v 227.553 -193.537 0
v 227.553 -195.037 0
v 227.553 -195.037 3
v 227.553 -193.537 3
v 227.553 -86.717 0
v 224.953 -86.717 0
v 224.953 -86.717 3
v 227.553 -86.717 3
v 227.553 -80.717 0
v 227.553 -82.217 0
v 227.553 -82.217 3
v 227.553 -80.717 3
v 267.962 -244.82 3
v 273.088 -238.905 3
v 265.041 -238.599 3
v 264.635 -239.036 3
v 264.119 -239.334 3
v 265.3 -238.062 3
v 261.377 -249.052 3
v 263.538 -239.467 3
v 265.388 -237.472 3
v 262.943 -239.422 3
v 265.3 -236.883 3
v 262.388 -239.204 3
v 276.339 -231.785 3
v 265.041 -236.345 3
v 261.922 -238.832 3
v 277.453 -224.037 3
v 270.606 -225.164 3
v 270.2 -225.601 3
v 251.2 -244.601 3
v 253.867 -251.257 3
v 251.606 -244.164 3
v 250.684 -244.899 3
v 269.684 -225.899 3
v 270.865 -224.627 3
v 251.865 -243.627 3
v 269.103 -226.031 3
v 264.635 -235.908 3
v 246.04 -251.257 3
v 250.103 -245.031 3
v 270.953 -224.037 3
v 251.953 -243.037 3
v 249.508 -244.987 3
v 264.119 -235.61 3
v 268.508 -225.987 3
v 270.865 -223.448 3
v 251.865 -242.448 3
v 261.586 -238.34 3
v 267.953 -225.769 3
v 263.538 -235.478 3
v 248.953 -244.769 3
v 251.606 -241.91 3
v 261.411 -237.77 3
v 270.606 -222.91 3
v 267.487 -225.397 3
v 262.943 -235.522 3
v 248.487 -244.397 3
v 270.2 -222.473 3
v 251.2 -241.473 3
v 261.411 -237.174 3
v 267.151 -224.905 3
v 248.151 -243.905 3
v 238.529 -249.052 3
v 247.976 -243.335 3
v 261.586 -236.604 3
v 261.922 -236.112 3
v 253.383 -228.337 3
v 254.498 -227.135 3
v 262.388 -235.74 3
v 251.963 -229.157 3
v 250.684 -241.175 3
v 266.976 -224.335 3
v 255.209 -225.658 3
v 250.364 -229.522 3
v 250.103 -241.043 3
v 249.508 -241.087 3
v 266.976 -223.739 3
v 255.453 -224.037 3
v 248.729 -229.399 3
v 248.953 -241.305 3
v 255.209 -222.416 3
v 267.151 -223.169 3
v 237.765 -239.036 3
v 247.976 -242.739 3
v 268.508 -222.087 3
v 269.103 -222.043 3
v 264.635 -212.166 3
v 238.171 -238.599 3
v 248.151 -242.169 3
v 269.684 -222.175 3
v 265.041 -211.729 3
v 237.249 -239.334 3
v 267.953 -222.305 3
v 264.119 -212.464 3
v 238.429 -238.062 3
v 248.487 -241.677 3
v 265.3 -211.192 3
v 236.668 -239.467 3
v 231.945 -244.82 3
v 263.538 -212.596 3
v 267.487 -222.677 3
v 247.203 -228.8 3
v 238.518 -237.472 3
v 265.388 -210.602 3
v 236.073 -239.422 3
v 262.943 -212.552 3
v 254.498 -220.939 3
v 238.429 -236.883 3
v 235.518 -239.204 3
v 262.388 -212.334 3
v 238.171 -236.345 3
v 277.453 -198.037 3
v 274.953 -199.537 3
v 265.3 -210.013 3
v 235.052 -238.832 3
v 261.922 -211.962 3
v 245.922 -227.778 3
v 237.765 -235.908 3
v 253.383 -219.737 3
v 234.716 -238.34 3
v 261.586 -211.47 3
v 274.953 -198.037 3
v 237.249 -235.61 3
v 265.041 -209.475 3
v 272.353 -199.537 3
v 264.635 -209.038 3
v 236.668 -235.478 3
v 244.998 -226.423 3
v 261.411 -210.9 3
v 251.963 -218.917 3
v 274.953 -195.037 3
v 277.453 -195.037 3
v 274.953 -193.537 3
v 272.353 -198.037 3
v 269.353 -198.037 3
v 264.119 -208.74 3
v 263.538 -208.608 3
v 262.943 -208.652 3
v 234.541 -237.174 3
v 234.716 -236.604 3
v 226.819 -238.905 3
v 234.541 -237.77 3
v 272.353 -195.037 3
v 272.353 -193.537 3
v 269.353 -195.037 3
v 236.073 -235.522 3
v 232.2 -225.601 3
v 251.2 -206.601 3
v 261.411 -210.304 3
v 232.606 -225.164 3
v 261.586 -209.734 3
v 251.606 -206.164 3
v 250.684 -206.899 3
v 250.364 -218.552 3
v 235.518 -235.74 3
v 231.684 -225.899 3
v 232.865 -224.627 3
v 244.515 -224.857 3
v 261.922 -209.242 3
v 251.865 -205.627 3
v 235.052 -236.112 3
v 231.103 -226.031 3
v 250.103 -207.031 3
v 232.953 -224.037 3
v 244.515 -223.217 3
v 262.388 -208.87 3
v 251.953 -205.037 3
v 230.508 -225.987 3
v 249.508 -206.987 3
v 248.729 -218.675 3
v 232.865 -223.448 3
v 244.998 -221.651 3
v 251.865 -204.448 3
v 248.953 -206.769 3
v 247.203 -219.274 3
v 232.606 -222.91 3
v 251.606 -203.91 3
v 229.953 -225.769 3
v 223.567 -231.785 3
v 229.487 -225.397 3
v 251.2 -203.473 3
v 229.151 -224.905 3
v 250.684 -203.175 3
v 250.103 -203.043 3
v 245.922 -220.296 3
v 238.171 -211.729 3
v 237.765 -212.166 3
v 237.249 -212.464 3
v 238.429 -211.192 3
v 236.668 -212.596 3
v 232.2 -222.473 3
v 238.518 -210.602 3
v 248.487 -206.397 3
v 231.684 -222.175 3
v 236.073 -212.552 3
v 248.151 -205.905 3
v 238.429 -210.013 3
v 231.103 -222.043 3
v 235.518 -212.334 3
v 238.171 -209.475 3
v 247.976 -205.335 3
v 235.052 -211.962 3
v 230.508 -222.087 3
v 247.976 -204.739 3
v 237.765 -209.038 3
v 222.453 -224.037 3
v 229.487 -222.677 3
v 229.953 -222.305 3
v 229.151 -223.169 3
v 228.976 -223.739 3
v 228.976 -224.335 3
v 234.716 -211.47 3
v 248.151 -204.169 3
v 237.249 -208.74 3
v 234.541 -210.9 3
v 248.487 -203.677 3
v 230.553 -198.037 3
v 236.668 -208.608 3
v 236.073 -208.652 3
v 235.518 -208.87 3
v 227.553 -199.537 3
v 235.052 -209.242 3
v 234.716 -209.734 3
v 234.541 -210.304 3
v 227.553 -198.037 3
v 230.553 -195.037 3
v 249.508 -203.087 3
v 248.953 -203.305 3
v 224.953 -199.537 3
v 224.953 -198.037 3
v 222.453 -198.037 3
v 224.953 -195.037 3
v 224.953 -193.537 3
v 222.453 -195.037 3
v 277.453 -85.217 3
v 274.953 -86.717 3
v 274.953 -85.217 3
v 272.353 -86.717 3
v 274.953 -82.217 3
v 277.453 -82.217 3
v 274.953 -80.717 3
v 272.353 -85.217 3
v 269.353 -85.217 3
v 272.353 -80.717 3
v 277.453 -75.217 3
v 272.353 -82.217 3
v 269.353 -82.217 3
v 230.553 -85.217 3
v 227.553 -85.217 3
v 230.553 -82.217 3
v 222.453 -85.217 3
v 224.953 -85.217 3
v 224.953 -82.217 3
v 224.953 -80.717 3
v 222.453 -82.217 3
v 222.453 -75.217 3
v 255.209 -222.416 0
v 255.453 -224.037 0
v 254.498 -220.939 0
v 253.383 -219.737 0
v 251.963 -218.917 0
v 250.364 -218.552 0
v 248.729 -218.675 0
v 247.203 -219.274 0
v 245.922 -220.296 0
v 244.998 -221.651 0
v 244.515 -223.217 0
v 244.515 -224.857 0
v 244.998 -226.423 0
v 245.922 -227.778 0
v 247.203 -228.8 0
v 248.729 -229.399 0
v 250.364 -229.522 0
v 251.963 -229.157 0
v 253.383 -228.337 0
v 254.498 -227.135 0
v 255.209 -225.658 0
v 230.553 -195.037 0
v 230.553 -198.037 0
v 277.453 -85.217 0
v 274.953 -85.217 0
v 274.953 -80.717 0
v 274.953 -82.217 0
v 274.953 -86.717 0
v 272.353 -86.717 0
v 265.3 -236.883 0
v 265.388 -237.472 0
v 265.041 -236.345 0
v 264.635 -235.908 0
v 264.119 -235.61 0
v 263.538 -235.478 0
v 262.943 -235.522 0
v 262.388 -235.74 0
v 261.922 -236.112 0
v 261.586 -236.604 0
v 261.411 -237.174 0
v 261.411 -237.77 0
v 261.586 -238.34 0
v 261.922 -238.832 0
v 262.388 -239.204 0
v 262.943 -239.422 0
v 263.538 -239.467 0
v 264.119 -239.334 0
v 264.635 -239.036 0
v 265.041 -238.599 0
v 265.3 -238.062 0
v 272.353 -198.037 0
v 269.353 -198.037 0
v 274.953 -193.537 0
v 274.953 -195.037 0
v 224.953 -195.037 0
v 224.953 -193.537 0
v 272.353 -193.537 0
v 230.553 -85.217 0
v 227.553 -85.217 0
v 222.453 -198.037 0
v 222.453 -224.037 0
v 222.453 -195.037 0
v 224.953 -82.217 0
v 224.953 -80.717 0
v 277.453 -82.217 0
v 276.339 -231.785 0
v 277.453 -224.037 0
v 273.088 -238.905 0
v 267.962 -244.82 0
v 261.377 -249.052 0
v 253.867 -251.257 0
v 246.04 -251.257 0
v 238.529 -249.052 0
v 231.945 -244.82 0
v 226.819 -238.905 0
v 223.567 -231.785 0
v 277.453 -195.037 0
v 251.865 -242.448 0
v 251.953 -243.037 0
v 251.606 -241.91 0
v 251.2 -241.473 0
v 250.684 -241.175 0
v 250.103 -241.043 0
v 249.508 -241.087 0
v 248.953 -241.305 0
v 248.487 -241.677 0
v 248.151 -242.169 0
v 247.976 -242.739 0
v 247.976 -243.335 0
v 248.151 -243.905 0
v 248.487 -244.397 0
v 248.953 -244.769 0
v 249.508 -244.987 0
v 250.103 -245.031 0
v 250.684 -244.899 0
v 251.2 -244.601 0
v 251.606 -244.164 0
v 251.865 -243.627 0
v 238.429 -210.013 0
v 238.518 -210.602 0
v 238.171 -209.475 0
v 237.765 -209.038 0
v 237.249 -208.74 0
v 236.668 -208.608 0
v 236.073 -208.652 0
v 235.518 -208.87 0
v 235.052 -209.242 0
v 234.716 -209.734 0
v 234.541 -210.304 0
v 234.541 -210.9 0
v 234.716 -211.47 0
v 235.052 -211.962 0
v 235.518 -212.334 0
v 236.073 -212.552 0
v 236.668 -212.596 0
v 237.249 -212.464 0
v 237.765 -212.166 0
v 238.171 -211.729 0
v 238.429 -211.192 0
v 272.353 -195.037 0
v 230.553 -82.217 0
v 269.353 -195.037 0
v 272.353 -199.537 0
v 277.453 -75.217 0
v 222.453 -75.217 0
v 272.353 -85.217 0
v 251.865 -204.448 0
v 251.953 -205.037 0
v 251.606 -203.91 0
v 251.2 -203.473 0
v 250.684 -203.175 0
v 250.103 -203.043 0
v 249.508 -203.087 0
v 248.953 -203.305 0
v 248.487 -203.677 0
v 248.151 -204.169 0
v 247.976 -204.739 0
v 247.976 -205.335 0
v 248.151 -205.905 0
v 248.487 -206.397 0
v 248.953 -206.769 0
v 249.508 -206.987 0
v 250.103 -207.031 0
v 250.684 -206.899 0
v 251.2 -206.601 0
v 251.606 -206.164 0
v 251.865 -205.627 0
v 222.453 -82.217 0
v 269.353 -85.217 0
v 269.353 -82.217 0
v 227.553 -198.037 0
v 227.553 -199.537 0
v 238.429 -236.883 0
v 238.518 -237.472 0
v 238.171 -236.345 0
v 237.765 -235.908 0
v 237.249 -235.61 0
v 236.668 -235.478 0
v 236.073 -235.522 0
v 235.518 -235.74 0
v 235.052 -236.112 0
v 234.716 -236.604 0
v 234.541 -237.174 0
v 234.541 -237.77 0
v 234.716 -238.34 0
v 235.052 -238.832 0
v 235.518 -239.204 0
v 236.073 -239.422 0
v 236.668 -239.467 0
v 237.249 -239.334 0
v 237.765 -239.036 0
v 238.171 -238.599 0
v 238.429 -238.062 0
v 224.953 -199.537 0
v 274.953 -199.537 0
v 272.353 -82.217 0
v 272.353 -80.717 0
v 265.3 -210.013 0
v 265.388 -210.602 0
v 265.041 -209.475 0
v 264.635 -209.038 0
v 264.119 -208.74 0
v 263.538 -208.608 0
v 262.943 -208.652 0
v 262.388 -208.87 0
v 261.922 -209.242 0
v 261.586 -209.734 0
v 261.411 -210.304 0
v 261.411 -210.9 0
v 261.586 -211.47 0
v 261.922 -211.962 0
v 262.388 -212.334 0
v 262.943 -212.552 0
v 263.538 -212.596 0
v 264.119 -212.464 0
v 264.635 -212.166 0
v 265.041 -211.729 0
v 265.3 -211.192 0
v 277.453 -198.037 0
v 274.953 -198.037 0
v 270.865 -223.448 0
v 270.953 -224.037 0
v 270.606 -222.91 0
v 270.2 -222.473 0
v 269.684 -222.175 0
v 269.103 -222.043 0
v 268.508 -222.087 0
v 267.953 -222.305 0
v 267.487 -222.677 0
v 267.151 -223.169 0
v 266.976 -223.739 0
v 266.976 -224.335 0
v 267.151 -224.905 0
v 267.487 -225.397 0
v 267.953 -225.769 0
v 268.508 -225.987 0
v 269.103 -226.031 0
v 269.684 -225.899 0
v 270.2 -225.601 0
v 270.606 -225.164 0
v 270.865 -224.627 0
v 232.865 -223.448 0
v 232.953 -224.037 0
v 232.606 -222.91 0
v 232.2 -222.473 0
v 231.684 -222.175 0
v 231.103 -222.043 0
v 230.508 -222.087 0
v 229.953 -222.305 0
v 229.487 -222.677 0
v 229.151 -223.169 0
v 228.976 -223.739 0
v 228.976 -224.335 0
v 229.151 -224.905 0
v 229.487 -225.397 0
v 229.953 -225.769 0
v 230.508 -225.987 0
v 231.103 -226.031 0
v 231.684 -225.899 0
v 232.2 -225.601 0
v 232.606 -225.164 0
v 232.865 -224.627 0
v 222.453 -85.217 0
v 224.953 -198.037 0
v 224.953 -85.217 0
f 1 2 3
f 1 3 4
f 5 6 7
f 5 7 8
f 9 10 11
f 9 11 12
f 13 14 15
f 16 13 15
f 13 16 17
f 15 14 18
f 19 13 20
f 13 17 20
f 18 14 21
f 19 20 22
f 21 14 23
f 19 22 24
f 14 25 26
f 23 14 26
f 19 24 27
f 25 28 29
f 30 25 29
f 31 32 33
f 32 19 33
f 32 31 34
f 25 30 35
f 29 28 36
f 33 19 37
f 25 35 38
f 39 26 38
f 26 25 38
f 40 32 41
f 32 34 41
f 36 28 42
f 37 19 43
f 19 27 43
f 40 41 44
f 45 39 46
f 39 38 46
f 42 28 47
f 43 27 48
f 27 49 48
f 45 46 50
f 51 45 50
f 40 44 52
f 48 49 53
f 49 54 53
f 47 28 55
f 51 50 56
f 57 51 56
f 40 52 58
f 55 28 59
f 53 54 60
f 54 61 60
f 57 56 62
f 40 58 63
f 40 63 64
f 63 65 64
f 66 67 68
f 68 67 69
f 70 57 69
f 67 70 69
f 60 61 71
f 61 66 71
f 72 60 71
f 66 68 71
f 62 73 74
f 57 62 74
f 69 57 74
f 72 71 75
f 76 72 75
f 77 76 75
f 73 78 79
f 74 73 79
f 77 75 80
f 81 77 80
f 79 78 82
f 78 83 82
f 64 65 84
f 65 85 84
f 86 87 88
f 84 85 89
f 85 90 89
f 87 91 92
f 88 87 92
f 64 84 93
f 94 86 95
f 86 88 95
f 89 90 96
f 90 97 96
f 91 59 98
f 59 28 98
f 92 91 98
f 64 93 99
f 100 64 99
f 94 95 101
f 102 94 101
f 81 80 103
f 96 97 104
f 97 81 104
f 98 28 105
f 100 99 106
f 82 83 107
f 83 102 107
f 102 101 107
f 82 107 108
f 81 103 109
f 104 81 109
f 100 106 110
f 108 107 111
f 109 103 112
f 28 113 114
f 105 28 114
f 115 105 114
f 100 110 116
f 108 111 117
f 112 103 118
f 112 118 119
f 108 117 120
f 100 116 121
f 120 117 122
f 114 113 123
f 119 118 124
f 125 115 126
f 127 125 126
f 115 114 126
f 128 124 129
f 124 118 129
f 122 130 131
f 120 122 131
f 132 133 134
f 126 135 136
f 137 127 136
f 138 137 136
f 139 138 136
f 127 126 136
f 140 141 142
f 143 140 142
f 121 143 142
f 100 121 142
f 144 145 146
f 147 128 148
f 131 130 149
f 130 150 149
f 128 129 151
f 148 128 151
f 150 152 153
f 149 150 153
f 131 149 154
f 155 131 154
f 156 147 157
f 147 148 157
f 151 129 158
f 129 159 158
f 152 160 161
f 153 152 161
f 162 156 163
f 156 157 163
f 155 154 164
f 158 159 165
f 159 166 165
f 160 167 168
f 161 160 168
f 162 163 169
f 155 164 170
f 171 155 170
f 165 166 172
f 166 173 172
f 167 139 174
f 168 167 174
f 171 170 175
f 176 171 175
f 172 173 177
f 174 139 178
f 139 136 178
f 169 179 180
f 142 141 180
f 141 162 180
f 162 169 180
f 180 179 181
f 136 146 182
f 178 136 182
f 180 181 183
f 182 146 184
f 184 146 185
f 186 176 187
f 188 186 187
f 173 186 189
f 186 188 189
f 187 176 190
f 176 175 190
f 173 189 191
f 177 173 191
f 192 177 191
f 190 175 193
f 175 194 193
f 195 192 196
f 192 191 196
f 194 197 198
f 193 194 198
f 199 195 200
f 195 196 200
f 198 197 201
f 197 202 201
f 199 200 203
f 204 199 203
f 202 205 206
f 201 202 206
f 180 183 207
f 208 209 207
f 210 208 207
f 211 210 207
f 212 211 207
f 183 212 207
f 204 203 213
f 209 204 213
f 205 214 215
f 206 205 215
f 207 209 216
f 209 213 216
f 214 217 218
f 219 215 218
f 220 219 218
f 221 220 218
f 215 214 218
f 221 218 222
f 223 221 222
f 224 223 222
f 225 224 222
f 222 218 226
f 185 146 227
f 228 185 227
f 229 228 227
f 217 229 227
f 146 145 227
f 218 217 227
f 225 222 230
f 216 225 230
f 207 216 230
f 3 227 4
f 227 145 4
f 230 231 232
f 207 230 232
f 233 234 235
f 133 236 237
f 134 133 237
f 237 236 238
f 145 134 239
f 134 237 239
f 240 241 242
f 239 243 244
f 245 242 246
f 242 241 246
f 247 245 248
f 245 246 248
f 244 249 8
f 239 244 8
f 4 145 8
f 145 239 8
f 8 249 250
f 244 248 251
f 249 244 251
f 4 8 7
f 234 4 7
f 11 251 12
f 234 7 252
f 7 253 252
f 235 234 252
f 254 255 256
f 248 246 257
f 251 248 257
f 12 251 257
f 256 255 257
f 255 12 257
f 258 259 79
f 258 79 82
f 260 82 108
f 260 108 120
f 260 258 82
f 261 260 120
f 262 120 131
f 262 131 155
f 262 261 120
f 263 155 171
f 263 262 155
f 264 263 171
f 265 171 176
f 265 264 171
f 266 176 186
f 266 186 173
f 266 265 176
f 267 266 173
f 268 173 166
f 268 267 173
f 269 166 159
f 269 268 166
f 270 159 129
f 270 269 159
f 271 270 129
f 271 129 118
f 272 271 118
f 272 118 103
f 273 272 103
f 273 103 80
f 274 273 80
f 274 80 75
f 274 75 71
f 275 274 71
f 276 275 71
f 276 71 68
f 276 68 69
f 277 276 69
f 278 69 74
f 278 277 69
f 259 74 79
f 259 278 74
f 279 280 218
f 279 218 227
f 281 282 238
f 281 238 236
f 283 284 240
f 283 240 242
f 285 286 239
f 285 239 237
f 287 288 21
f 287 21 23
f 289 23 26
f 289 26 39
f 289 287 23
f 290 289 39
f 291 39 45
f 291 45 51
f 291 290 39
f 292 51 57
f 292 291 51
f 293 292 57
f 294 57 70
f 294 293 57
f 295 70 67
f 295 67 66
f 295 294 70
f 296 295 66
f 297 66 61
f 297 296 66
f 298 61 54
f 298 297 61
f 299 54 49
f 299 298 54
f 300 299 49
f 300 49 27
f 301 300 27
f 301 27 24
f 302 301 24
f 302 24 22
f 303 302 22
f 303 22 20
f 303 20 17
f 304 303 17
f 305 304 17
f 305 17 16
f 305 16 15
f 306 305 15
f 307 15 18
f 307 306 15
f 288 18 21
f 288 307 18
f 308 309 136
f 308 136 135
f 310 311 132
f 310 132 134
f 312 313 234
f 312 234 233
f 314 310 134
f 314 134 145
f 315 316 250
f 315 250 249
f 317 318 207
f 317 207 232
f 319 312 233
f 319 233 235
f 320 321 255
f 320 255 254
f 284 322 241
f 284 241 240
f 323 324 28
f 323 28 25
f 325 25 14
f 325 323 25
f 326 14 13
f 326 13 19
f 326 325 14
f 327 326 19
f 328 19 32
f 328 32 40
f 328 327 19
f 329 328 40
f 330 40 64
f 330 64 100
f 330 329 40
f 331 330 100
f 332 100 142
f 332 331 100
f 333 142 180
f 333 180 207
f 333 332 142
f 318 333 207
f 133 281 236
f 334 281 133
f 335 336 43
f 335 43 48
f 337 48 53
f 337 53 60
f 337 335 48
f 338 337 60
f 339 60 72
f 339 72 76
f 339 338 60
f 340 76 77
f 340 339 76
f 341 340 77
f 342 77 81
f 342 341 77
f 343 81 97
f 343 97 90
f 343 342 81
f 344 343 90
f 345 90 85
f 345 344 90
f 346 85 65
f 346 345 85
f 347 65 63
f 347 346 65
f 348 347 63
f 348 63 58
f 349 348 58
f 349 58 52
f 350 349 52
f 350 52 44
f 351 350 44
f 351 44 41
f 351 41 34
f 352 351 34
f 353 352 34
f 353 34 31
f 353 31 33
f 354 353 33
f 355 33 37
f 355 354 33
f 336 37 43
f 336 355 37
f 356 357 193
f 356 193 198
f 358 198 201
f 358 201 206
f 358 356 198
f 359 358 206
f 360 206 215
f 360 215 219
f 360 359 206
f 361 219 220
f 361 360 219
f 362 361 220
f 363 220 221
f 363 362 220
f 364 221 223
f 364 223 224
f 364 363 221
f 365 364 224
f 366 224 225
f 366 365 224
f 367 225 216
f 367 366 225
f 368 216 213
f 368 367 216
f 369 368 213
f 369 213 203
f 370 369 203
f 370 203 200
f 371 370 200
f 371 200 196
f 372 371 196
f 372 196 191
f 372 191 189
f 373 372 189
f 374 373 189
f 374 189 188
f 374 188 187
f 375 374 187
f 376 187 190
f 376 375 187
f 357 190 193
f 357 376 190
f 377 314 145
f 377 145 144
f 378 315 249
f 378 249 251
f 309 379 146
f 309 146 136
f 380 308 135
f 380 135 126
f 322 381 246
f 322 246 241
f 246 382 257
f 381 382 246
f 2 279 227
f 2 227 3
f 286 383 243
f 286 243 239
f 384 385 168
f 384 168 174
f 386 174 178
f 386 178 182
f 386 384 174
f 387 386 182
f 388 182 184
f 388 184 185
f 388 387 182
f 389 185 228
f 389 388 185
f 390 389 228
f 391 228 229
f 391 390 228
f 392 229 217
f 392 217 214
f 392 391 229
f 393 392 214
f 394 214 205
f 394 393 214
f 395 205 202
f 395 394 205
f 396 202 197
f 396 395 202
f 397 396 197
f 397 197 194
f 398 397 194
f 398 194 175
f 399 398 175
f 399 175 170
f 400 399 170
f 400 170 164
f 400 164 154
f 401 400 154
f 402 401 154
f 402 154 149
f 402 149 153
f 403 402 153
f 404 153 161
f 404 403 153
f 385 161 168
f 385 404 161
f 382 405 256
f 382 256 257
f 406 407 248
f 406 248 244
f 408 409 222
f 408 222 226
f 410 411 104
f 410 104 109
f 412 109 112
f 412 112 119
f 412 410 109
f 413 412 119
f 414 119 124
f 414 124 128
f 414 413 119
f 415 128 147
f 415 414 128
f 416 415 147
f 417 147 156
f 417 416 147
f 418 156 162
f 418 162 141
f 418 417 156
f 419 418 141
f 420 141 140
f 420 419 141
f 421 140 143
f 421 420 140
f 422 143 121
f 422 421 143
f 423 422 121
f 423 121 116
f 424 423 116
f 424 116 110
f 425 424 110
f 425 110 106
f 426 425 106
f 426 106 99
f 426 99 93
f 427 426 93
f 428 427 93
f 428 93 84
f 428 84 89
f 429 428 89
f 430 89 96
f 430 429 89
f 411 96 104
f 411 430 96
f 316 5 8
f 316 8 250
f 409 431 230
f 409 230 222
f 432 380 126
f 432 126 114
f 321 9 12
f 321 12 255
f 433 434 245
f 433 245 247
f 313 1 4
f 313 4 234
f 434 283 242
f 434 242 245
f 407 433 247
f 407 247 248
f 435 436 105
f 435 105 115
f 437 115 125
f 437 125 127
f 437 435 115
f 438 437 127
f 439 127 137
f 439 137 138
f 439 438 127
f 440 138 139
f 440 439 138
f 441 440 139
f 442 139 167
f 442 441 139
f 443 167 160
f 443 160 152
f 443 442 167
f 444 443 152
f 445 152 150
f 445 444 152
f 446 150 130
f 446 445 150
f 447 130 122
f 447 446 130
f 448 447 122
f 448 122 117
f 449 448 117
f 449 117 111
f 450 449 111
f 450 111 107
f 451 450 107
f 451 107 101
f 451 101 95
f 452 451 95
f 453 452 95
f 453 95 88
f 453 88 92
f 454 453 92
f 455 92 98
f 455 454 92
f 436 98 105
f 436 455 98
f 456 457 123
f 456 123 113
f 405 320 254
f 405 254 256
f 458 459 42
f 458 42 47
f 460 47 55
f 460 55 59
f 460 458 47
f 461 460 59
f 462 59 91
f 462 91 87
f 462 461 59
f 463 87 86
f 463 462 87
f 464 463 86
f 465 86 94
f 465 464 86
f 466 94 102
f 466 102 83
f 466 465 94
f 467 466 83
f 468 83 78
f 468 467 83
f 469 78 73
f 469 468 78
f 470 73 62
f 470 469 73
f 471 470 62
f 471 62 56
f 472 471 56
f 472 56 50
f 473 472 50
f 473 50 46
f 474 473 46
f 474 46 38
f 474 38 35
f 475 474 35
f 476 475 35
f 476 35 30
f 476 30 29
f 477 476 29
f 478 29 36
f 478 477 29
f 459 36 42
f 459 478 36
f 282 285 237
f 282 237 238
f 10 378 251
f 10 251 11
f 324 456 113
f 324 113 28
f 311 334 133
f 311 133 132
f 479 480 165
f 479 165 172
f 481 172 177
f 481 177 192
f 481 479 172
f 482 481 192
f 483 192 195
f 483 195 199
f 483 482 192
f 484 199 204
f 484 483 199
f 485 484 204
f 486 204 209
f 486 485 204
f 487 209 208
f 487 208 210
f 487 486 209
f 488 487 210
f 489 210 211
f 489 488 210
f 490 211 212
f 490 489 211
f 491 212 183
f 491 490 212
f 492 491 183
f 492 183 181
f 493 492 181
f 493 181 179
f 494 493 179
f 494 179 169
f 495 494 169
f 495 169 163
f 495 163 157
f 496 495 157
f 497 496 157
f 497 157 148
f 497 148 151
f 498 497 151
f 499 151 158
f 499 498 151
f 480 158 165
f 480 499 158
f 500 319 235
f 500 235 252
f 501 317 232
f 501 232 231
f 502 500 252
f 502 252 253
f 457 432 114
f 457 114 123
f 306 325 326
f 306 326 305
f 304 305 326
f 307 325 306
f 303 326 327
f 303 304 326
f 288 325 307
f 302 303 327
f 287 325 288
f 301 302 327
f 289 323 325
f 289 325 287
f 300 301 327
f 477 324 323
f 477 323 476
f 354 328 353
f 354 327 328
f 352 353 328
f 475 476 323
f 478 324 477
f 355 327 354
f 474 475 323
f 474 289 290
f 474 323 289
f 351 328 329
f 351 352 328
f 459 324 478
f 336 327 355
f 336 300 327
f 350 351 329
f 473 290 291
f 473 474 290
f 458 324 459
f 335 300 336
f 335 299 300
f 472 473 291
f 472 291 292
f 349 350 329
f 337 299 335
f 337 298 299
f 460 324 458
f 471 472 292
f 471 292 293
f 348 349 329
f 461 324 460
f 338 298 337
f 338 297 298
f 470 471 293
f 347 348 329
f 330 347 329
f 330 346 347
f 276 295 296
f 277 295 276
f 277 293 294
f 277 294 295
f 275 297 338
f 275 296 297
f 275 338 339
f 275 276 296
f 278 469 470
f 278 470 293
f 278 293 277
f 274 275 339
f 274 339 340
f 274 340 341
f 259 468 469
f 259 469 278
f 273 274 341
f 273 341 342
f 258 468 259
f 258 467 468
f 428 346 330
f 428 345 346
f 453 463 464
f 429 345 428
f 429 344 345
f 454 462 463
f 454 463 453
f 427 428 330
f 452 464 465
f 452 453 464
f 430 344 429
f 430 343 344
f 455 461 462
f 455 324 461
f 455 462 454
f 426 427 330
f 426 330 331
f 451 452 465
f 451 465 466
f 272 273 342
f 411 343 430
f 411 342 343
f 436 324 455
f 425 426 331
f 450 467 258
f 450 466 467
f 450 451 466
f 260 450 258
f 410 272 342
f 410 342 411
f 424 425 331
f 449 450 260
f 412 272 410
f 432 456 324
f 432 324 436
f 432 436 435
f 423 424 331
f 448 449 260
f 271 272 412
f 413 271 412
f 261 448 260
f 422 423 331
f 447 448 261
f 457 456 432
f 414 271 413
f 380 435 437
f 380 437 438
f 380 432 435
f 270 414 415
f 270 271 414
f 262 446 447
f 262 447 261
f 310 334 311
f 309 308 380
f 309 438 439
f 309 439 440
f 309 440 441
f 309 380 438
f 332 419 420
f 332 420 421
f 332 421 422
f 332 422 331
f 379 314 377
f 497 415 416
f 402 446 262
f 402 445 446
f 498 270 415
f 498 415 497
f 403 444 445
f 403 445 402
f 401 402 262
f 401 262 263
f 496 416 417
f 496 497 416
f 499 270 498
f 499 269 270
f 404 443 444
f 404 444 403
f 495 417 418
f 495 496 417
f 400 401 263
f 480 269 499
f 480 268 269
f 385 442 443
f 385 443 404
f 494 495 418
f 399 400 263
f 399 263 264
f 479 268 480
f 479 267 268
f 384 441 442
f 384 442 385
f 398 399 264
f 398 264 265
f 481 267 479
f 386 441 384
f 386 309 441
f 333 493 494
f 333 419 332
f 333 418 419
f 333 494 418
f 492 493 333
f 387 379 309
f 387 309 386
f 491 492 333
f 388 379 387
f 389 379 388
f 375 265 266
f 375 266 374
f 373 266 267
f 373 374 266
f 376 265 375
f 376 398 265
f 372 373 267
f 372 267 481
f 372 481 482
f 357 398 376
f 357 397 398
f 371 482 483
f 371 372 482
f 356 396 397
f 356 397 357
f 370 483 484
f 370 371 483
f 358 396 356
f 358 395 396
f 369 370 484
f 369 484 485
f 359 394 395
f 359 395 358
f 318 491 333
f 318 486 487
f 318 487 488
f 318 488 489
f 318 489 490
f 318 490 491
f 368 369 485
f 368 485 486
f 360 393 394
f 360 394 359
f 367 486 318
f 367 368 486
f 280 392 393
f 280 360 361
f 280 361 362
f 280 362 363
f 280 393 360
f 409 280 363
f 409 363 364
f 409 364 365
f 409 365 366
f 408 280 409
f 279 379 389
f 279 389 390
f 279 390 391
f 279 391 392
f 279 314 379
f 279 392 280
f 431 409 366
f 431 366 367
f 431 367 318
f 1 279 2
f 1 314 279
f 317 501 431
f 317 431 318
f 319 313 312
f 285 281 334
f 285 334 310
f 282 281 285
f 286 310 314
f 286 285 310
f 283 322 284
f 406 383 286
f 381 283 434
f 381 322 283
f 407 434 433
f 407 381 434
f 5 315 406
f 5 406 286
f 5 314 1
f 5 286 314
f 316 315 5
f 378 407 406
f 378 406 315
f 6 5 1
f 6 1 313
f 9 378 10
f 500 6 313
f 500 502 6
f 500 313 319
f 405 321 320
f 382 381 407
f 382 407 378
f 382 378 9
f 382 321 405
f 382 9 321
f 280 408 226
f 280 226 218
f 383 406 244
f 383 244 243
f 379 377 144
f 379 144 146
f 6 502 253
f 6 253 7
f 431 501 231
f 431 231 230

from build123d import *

# Parameters (mm, degrees)
SKETCH_1_R      = 5.5
SKETCH_1_R_2    = 2
EXTRUDE_1_DEPTH = 3


with BuildPart() as part:
    # 草图1 → 凸台-拉伸1 (new body)
    with BuildSketch(Plane.XY):
        with BuildLine():
            Line((222.453360513, -82.216557036), (222.453360513, -75.216557036))
            Line((222.453360513, -75.216557036), (277.453360513, -75.216557036))
            Line((277.453360513, -75.216557036), (277.453360513, -82.216557036))
            Line((277.453360513, -82.216557036), (274.953360513, -82.216557036))
            Line((274.953360513, -82.216557036), (274.953360513, -80.716557036))
            Line((274.953360513, -80.716557036), (272.353360513, -80.716557036))
            Line((272.353360513, -80.716557036), (272.353360513, -82.216557036))
            Line((272.353360513, -82.216557036), (269.353360513, -82.216557036))
            Line((269.353360513, -82.216557036), (269.353360513, -85.216557036))
            Line((269.353360513, -85.216557036), (272.353360513, -85.216557036))
            Line((272.353360513, -85.216557036), (272.353360513, -86.716557036))
            Line((272.353360513, -86.716557036), (274.953360513, -86.716557036))
            Line((274.953360513, -86.716557036), (274.953360513, -85.216557036))
            Line((274.953360513, -85.216557036), (277.453360513, -85.216557036))
            Line((277.453360513, -85.216557036), (277.453360513, -195.037068397))
            Line((277.453360513, -195.037068397), (274.953360513, -195.037068397))
            Line((274.953360513, -195.037068397), (274.953360513, -193.537068397))
            Line((274.953360513, -193.537068397), (272.353360513, -193.537068397))
            Line((272.353360513, -193.537068397), (272.353360513, -195.037068397))
            Line((272.353360513, -195.037068397), (269.353360513, -195.037068397))
            Line((269.353360513, -195.037068397), (269.353360513, -198.037068397))
            Line((269.353360513, -198.037068397), (272.353360513, -198.037068397))
            Line((272.353360513, -198.037068397), (272.353360513, -199.537068397))
            Line((272.353360513, -199.537068397), (274.953360513, -199.537068397))
            Line((274.953360513, -199.537068397), (274.953360513, -198.037068397))
            Line((274.953360513, -198.037068397), (277.453360513, -198.037068397))
            Line((277.453360513, -198.037068397), (277.453360513, -224.037068397))
            ThreePointArc((277.453360513, -224.037068397), (249.953360513, -251.537068397), (222.453360513, -224.037068397))
            Line((222.453360513, -224.037068397), (222.453360513, -198.037068397))
            Line((222.453360513, -198.037068397), (224.953360513, -198.037068397))
            Line((224.953360513, -198.037068397), (224.953360513, -199.537068397))
            Line((224.953360513, -199.537068397), (227.553360513, -199.537068397))
            Line((227.553360513, -199.537068397), (227.553360513, -198.037068397))
            Line((227.553360513, -198.037068397), (230.553360513, -198.037068397))
            Line((230.553360513, -198.037068397), (230.553360513, -195.037068397))
            Line((230.553360513, -195.037068397), (227.553360513, -195.037068397))
            Line((227.553360513, -195.037068397), (227.553360513, -193.537068397))
            Line((227.553360513, -193.537068397), (224.953360513, -193.537068397))
            Line((224.953360513, -193.537068397), (224.953360513, -195.037068397))
            Line((224.953360513, -195.037068397), (222.453360513, -195.037068397))
            Line((222.453360513, -195.037068397), (222.453360513, -85.216557036))
            Line((222.453360513, -85.216557036), (224.953360513, -85.216557036))
            Line((224.953360513, -85.216557036), (224.953360513, -86.716557036))
            Line((224.953360513, -86.716557036), (227.553360513, -86.716557036))
            Line((227.553360513, -86.716557036), (227.553360513, -85.216557036))
            Line((227.553360513, -85.216557036), (230.553360513, -85.216557036))
            Line((230.553360513, -85.216557036), (230.553360513, -82.216557036))
            Line((230.553360513, -82.216557036), (227.553360513, -82.216557036))
            Line((227.553360513, -82.216557036), (227.553360513, -80.716557036))
            Line((227.553360513, -80.716557036), (224.953360513, -80.716557036))
            Line((224.953360513, -80.716557036), (224.953360513, -82.216557036))
            Line((224.953360513, -82.216557036), (222.453360513, -82.216557036))
        make_face()
        with Locations((249.953360513, -224.037068397)):
            Circle(SKETCH_1_R, mode=Mode.SUBTRACT)
        with Locations((249.953360513, -205.037068397)):
            Circle(SKETCH_1_R_2, mode=Mode.SUBTRACT)
        with Locations((263.388389356, -210.602039555)):
            Circle(SKETCH_1_R_2, mode=Mode.SUBTRACT)
        with Locations((268.953360513, -224.037068397)):
            Circle(SKETCH_1_R_2, mode=Mode.SUBTRACT)
        with Locations((263.388389356, -237.47209724)):
            Circle(SKETCH_1_R_2, mode=Mode.SUBTRACT)
        with Locations((249.953360513, -243.037068397)):
            Circle(SKETCH_1_R_2, mode=Mode.SUBTRACT)
        with Locations((236.518331671, -237.47209724)):
            Circle(SKETCH_1_R_2, mode=Mode.SUBTRACT)
        with Locations((230.953360513, -224.037068397)):
            Circle(SKETCH_1_R_2, mode=Mode.SUBTRACT)
        with Locations((236.518331671, -210.602039555)):
            Circle(SKETCH_1_R_2, mode=Mode.SUBTRACT)
    extrude(amount=EXTRUDE_1_DEPTH)


solid = part.part
